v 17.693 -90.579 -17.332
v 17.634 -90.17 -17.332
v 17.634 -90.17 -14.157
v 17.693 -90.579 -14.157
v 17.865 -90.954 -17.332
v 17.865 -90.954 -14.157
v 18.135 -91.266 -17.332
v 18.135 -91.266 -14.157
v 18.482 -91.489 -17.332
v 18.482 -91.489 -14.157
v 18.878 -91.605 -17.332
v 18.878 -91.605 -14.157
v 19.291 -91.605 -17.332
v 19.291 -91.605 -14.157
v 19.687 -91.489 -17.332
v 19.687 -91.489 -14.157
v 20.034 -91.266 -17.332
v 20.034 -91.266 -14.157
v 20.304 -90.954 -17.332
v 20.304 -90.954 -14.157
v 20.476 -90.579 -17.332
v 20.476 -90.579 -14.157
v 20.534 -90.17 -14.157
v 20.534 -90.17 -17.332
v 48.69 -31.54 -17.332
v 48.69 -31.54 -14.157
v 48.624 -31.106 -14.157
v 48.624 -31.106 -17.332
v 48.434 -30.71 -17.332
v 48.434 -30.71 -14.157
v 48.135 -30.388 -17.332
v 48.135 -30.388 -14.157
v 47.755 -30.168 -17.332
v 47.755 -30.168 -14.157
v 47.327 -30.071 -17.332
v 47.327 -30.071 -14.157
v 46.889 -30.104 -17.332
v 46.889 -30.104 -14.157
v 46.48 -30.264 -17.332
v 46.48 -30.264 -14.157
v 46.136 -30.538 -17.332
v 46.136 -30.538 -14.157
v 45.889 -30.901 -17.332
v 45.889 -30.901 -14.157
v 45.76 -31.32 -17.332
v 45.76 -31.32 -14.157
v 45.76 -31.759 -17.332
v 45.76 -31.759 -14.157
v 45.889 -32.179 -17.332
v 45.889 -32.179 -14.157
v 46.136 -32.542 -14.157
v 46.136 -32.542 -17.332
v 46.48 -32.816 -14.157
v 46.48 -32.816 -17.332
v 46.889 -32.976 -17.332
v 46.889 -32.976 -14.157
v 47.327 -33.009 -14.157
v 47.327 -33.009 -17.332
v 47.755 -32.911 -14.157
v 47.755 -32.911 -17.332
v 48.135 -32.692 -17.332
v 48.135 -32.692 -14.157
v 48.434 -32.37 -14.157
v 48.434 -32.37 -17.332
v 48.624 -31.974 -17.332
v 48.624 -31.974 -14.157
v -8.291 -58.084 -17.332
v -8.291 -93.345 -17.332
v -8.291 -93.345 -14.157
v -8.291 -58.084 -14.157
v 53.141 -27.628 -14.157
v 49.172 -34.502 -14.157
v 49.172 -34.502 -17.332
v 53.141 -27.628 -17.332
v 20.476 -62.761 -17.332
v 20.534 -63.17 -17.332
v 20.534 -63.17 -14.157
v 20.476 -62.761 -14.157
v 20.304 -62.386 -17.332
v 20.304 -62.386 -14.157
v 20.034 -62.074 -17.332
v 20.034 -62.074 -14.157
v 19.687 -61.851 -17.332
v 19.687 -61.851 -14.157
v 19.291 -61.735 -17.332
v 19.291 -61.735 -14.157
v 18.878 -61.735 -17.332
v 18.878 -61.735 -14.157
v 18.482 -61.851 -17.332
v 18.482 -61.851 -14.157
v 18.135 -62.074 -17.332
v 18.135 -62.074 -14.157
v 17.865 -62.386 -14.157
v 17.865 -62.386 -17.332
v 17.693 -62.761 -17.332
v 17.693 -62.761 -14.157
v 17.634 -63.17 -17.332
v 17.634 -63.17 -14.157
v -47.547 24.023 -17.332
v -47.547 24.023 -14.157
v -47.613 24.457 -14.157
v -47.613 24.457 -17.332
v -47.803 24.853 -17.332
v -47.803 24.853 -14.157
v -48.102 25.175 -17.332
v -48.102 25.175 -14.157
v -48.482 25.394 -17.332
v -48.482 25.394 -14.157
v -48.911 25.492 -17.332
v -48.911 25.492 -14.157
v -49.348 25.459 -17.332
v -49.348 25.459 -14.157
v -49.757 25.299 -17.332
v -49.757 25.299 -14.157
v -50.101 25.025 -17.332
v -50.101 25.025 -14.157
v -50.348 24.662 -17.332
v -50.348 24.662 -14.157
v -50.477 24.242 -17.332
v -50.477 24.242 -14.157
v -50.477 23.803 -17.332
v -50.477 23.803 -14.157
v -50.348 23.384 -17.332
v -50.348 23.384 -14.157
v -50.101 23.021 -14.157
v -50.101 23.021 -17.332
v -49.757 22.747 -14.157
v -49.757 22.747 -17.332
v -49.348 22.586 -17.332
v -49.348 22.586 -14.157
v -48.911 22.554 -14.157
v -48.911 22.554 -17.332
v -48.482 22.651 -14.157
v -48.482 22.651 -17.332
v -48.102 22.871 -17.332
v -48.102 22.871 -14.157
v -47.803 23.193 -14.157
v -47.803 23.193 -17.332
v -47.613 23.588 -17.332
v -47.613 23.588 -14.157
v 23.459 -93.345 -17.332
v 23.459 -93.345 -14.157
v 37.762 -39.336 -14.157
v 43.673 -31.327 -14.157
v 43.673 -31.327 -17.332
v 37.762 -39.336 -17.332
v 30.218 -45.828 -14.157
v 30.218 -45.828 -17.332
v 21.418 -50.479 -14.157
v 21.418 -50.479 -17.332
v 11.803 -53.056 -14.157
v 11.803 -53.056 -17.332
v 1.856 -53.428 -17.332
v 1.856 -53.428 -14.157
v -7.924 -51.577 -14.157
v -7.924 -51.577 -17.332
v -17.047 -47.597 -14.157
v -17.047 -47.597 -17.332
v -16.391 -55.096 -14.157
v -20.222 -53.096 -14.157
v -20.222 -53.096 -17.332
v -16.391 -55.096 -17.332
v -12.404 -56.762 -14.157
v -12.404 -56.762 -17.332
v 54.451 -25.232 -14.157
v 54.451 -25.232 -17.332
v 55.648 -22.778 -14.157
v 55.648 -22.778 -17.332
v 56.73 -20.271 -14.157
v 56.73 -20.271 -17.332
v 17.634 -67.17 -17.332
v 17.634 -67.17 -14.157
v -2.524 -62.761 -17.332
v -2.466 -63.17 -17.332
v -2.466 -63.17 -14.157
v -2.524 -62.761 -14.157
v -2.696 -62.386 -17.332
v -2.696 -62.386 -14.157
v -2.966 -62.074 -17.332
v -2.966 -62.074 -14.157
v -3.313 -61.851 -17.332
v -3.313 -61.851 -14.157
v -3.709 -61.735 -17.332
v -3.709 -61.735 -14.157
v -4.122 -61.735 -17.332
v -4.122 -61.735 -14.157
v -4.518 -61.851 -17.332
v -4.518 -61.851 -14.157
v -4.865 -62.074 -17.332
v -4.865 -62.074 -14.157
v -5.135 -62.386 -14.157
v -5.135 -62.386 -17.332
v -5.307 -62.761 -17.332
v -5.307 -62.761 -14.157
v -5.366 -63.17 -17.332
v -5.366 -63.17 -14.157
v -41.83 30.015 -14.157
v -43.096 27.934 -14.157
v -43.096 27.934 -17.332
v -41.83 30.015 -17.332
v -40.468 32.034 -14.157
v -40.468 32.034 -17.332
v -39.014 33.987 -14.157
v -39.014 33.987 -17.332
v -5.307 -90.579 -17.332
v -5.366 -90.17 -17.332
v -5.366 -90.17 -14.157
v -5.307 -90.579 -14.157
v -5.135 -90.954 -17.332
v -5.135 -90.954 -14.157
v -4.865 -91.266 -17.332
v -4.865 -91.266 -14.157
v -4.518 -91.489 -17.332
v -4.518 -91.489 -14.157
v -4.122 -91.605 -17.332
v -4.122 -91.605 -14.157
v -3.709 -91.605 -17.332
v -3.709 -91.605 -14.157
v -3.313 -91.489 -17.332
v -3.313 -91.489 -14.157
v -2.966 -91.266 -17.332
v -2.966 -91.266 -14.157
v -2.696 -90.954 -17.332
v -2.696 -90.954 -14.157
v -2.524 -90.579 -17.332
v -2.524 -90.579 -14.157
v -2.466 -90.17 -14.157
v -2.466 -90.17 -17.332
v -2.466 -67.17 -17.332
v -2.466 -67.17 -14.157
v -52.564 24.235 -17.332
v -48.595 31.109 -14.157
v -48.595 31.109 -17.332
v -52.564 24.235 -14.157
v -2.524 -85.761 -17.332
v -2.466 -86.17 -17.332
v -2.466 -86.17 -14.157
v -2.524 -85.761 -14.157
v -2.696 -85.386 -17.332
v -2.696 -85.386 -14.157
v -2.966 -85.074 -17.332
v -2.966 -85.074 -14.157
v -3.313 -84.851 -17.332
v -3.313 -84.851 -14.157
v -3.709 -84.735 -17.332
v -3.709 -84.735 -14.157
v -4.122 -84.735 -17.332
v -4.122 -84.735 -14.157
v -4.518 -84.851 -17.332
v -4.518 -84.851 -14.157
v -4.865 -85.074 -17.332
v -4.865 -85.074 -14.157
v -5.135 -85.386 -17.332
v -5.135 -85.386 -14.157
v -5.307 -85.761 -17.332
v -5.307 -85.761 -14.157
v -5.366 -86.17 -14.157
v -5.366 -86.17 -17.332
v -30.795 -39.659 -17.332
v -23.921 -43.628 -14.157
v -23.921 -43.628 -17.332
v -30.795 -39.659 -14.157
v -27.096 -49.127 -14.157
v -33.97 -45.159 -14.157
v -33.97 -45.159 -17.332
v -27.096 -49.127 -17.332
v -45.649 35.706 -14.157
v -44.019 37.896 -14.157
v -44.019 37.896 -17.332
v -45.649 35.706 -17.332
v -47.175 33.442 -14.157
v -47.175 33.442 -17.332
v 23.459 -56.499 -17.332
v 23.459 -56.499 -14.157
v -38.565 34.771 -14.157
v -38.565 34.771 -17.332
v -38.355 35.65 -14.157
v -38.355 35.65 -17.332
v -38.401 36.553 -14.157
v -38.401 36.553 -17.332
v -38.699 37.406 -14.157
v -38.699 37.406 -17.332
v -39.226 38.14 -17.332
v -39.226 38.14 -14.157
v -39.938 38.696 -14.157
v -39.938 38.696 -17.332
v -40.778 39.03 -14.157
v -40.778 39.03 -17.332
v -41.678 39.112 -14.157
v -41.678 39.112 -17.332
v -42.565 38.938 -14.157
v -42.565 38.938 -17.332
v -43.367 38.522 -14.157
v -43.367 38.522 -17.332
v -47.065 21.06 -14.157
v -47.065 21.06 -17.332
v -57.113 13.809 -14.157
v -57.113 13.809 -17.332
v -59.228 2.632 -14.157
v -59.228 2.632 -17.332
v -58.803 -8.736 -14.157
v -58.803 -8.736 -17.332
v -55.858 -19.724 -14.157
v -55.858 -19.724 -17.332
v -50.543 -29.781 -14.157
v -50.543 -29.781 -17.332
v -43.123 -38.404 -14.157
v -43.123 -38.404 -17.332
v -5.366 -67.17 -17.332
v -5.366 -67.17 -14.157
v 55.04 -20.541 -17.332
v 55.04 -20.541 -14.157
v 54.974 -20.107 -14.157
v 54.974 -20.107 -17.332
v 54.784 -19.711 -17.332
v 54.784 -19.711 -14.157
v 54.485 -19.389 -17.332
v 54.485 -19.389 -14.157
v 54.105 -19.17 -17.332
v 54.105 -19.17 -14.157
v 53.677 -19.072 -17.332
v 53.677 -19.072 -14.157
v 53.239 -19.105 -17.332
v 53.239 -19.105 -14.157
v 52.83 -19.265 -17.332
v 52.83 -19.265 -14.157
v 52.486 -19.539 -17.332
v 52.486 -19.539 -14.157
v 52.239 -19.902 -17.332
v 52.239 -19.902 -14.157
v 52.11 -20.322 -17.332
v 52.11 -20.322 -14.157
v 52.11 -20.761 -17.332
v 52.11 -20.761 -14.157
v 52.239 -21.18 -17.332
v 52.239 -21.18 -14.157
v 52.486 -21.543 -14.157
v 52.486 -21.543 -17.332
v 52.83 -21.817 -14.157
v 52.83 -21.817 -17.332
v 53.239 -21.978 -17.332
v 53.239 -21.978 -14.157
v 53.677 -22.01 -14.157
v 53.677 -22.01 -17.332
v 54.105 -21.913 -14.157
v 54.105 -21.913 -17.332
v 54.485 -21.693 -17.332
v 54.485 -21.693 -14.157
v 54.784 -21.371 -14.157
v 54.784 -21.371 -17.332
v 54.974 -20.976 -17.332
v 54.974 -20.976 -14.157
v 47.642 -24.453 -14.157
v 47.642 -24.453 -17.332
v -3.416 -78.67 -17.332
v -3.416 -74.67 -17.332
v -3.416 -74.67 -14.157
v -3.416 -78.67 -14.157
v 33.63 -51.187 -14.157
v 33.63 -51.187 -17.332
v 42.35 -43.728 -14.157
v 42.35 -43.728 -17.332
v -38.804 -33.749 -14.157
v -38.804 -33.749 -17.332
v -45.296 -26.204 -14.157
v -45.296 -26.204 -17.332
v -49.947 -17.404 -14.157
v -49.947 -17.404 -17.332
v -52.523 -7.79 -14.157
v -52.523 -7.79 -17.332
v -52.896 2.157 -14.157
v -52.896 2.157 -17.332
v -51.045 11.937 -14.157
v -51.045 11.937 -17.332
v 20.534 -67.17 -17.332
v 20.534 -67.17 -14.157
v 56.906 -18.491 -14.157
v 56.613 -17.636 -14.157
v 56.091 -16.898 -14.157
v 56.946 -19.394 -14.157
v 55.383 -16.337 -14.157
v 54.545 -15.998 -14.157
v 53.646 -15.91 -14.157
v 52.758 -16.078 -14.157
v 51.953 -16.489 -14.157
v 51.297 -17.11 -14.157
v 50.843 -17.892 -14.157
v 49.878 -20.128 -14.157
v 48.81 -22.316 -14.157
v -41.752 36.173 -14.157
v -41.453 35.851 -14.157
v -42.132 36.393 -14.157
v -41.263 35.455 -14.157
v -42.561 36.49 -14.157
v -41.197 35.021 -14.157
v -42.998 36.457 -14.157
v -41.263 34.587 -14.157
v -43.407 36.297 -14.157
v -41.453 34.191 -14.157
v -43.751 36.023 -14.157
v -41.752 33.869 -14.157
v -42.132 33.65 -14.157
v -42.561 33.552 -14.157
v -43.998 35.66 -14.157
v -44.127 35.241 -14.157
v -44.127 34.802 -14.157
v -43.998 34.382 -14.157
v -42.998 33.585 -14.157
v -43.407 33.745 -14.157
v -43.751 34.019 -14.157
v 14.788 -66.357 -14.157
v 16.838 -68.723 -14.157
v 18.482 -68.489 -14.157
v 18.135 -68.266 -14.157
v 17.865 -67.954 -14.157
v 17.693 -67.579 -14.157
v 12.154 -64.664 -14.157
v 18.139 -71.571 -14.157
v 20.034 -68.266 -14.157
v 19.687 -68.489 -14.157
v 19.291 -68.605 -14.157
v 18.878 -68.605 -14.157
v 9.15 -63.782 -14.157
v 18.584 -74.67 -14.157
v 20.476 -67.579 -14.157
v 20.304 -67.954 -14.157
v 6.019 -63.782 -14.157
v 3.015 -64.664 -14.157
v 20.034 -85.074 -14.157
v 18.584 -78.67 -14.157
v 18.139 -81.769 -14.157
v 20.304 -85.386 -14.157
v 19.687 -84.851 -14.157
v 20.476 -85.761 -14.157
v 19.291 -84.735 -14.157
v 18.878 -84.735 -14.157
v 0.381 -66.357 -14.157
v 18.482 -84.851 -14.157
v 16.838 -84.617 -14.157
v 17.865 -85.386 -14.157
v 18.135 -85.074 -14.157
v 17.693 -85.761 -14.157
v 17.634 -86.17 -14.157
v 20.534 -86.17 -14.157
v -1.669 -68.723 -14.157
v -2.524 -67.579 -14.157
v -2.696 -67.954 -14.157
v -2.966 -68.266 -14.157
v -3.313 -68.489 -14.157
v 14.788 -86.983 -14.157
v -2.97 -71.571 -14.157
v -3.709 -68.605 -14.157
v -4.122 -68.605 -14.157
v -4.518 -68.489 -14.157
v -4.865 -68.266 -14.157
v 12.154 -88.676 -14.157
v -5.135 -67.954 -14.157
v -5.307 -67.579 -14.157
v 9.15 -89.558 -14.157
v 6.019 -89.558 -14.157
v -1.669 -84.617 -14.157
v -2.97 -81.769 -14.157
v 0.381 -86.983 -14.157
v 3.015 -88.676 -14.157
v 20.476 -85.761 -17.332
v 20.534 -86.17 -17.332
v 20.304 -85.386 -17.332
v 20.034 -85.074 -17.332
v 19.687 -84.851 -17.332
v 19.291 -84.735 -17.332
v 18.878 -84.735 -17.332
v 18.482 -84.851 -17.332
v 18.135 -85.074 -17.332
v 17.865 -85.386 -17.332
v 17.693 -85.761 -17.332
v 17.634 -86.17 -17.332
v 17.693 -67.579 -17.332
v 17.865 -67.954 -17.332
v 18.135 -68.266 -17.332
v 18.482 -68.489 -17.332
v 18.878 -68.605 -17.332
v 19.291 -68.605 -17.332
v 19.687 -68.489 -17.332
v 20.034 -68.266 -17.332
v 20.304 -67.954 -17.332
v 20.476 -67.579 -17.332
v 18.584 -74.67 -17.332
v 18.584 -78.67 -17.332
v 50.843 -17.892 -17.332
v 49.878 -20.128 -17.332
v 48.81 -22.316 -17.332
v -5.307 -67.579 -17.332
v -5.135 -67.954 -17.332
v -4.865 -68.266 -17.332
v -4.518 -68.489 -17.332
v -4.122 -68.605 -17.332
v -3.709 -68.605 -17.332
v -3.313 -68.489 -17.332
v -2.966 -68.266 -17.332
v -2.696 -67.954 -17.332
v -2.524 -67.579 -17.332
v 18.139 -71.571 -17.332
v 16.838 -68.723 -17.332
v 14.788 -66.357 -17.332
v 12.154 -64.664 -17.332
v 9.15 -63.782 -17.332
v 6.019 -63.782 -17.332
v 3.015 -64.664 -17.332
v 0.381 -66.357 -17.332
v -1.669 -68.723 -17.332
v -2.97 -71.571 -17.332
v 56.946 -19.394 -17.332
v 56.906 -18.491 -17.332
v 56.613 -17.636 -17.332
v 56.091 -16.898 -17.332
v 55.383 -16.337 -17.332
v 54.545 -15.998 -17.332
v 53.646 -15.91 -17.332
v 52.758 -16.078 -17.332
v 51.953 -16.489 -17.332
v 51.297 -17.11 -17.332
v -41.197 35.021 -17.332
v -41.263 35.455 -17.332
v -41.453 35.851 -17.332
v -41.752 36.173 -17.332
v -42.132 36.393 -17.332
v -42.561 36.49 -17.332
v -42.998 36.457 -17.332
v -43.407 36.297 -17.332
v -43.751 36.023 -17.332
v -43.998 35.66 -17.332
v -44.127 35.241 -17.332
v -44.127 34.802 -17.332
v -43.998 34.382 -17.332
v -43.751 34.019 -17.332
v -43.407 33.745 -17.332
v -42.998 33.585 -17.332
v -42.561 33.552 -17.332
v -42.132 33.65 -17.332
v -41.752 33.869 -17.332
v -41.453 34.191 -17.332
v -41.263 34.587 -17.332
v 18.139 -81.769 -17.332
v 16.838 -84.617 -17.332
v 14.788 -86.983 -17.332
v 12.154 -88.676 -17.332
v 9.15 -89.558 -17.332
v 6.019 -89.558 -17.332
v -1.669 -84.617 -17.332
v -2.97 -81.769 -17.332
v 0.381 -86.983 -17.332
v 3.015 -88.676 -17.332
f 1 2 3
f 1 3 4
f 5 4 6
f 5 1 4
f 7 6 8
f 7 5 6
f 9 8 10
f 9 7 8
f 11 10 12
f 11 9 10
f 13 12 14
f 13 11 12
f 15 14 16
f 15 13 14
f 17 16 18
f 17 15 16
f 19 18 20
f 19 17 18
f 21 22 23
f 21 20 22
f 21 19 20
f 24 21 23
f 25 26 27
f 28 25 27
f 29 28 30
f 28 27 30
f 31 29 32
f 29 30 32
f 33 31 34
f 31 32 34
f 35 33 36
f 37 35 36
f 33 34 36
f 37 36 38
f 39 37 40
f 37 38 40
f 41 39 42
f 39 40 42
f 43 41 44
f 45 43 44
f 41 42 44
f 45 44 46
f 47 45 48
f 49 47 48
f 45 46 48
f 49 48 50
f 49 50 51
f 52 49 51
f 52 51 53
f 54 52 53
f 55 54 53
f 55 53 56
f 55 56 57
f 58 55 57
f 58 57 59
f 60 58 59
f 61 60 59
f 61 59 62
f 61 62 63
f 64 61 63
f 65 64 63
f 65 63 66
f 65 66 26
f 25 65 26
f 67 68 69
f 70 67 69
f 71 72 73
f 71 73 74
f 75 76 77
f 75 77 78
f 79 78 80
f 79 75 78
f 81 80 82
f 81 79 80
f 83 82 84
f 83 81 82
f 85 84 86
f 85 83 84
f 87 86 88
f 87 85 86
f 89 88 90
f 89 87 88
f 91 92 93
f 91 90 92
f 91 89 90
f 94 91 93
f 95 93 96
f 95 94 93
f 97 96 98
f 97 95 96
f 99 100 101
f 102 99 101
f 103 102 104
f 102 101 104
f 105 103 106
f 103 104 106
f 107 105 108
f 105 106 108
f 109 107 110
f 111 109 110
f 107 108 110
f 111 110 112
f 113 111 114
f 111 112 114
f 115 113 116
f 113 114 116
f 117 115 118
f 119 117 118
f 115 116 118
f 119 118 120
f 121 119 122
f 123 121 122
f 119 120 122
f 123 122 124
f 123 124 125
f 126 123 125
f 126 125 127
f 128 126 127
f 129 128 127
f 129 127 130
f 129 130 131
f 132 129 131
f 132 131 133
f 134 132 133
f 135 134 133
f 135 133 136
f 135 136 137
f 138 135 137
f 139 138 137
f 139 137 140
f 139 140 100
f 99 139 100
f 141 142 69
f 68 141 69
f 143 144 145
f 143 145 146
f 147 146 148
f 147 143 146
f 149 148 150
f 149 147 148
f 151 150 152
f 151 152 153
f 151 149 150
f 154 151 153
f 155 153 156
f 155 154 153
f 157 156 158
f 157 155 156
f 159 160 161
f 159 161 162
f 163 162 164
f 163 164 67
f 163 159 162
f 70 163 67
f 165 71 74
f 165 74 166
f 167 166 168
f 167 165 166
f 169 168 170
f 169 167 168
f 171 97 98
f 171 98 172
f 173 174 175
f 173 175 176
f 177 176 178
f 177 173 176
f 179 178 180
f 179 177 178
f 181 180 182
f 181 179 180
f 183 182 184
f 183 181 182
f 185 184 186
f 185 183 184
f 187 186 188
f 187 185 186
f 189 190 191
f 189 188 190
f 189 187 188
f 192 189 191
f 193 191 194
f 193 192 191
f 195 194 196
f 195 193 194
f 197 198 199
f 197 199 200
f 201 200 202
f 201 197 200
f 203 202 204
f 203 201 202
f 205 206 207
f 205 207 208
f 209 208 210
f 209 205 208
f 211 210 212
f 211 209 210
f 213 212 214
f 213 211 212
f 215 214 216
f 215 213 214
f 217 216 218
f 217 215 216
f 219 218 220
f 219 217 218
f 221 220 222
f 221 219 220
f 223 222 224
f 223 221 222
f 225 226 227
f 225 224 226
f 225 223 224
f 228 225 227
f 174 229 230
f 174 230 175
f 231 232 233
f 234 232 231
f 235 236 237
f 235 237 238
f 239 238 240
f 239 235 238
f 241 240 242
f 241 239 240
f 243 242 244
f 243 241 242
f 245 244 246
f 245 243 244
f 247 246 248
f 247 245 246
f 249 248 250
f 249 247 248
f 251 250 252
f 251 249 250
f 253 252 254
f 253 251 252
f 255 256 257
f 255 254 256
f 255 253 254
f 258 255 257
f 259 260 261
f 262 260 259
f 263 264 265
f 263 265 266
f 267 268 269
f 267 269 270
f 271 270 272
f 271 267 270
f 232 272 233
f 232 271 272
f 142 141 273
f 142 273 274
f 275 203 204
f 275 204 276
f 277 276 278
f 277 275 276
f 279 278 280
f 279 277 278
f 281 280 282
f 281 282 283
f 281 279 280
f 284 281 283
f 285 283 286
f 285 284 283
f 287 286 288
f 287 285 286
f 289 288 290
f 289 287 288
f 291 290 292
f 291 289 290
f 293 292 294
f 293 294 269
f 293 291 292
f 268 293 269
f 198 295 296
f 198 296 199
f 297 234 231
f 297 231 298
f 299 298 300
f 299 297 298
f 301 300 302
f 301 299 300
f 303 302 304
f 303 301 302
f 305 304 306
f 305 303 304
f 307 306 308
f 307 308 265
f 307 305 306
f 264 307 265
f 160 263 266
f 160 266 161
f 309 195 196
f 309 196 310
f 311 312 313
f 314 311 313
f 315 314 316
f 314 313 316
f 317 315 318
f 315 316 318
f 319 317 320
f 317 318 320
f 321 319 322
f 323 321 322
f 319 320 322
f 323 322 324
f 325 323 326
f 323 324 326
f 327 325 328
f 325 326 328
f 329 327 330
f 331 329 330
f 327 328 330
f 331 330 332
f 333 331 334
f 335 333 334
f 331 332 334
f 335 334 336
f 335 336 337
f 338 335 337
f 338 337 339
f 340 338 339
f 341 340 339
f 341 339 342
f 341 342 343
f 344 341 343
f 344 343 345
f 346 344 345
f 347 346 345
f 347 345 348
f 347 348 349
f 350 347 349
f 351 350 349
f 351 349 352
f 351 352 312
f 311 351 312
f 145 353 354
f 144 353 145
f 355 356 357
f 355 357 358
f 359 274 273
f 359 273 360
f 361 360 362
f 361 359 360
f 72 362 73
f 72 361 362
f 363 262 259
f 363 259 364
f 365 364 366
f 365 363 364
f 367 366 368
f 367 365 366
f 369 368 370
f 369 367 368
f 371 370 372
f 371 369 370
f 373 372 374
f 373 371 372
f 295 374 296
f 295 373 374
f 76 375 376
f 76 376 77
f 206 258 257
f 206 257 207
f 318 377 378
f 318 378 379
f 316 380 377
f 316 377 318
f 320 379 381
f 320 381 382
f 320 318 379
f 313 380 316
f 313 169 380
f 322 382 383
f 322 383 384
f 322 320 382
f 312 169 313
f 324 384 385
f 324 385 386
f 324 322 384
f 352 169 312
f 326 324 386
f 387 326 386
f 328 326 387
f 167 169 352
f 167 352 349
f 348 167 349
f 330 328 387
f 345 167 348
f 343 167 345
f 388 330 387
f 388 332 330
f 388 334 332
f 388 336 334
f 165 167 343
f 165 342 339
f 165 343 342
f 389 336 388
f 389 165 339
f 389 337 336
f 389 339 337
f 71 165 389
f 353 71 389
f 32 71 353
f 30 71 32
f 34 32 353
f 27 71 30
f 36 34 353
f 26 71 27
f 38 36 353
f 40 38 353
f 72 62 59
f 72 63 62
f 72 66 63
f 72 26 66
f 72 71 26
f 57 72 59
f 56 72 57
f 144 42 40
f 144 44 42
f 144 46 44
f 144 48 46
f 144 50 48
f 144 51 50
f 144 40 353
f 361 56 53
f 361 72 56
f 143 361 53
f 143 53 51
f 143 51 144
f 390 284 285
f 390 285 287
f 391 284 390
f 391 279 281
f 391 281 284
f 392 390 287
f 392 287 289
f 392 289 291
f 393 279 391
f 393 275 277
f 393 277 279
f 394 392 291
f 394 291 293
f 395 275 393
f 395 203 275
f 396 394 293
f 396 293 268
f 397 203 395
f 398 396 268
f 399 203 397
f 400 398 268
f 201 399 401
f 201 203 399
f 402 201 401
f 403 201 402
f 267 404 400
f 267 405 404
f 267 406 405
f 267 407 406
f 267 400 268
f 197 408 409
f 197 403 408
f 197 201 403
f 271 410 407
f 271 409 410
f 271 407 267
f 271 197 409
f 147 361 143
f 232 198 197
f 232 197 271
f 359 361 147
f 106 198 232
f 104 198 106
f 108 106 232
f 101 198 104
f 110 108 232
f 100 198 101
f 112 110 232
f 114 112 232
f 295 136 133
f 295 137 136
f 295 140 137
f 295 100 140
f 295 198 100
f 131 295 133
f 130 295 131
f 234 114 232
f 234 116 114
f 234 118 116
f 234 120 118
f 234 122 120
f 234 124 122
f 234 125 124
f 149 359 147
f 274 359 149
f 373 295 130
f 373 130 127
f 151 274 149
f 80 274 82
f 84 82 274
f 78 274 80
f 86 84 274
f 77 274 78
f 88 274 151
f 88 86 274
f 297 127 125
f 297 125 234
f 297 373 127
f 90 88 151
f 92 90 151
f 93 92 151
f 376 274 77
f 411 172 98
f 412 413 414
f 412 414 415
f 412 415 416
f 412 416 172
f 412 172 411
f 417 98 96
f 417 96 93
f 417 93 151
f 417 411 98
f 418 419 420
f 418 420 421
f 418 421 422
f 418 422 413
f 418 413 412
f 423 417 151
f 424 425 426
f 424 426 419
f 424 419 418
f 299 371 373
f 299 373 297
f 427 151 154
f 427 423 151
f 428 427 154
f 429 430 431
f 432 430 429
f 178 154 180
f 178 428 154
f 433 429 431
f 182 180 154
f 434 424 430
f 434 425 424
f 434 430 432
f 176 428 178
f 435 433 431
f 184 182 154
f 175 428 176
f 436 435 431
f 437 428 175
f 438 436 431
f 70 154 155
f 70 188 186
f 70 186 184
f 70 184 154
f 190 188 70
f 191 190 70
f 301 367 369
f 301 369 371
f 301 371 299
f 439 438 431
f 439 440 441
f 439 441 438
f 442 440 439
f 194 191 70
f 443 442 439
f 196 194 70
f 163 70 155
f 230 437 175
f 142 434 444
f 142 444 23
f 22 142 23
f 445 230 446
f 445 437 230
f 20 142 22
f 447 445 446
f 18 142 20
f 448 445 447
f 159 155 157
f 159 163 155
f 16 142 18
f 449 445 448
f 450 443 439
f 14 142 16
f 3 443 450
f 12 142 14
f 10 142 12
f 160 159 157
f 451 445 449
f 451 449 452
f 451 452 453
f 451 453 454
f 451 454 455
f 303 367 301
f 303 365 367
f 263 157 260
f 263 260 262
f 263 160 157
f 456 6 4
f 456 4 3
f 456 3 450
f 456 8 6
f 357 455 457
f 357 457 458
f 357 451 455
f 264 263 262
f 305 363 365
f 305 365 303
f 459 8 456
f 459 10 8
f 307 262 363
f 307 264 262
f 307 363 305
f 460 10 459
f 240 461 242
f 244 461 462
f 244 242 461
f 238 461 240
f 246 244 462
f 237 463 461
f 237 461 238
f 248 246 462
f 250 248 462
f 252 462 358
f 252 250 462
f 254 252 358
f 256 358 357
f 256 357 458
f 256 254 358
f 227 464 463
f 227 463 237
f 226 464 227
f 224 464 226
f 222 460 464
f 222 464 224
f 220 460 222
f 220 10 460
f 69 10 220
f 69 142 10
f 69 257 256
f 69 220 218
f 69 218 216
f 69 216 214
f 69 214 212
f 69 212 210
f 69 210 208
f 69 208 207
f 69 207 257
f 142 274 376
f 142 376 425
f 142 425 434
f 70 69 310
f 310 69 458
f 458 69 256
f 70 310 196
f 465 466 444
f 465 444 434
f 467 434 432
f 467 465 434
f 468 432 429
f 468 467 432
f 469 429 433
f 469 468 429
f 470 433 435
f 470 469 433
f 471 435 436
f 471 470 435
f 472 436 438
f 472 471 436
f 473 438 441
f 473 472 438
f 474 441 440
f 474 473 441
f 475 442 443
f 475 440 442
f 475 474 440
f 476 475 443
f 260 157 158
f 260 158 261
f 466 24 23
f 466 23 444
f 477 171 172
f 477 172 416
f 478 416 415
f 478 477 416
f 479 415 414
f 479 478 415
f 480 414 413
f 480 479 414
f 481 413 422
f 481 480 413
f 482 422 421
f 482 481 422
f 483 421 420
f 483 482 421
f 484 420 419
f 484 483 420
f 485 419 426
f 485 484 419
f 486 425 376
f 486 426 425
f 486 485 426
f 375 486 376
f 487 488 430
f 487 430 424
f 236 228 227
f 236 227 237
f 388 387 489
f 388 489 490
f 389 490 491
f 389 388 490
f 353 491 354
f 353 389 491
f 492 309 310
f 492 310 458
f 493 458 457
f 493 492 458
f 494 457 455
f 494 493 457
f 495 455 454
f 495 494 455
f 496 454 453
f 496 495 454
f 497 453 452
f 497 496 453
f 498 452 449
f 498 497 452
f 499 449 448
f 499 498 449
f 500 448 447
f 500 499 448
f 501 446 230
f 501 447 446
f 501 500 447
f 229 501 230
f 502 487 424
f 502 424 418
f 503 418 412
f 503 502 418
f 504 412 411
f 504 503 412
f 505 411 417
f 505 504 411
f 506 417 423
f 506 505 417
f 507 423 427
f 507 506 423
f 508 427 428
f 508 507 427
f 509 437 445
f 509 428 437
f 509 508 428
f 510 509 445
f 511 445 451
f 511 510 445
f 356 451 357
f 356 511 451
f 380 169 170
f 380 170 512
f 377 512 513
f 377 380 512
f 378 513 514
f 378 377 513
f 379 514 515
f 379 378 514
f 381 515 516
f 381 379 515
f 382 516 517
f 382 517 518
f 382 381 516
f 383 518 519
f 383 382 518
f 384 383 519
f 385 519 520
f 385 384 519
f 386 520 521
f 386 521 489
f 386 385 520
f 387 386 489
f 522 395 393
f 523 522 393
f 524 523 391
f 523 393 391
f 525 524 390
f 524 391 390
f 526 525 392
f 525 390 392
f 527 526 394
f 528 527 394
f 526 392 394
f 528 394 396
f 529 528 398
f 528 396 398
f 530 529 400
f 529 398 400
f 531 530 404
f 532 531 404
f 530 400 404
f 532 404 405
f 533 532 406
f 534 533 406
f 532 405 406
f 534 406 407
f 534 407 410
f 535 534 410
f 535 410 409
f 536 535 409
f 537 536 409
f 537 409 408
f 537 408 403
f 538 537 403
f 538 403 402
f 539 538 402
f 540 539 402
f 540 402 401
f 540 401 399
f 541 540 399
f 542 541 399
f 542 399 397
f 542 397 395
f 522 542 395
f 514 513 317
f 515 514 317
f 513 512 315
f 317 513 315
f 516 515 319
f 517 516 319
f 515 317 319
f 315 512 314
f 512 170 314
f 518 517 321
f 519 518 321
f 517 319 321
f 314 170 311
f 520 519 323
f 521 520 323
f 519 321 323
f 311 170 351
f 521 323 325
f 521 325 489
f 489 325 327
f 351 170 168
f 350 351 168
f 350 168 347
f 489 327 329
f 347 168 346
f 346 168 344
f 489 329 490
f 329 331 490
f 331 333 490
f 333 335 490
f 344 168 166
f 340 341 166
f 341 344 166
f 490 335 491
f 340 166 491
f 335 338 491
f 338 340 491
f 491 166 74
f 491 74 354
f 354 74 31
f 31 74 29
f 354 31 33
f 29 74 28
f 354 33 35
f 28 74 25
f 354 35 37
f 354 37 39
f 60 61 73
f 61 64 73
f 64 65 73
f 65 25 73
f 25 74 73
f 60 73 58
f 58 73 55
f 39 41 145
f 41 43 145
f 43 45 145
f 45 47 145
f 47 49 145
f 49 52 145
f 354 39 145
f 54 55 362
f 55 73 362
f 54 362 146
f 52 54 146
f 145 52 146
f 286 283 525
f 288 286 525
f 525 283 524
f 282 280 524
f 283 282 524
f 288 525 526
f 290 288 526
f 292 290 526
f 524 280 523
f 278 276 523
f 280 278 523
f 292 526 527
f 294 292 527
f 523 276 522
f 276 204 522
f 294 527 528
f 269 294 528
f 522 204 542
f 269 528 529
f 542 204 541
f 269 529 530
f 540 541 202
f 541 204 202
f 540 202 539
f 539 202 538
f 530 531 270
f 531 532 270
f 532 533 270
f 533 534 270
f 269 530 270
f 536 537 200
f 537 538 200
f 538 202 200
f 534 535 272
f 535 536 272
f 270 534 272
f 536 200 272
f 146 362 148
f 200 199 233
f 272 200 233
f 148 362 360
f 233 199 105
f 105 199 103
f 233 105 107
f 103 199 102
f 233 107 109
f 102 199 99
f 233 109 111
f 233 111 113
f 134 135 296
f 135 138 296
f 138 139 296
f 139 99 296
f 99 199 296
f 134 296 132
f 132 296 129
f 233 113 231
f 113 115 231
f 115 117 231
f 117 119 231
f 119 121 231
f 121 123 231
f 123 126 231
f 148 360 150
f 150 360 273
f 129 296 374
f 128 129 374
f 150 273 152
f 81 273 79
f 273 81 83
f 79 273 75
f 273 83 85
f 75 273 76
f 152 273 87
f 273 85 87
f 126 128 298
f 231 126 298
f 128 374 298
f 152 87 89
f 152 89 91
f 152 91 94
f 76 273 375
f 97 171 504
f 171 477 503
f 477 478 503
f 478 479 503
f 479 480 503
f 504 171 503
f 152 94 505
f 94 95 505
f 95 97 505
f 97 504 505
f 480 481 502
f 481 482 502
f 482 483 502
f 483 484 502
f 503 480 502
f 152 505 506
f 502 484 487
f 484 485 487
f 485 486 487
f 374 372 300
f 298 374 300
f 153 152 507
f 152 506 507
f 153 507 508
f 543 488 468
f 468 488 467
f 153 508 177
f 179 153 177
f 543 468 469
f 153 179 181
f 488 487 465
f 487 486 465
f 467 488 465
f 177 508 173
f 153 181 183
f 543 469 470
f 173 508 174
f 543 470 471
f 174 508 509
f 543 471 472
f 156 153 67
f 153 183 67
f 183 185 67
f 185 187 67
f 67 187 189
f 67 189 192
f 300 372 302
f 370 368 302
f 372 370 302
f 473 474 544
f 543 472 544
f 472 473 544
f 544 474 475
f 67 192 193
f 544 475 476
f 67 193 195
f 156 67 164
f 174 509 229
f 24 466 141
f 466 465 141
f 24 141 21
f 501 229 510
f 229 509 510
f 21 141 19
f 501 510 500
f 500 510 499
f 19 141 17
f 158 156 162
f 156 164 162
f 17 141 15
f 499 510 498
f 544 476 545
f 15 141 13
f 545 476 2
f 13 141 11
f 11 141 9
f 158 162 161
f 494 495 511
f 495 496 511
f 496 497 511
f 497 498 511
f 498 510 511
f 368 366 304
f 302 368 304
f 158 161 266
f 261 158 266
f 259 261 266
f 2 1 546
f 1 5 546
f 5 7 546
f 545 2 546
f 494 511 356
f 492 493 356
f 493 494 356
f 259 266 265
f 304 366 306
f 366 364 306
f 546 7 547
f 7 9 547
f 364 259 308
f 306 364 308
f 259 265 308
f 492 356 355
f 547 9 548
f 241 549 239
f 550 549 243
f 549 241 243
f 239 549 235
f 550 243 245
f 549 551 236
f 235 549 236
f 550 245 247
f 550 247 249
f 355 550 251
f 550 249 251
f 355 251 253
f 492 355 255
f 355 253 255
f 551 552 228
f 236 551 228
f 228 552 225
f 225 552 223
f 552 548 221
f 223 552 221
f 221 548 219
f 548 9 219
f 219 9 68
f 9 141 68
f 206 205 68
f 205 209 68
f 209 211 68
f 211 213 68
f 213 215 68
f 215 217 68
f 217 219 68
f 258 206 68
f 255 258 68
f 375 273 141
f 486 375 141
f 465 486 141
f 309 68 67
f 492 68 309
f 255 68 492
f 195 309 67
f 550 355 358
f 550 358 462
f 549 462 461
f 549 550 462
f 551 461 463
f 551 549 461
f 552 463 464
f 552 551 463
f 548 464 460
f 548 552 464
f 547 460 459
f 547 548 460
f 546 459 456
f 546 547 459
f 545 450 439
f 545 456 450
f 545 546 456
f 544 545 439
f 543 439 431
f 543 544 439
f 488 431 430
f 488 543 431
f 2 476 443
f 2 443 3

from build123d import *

# Parameters (mm, degrees)
BOSS_EXTRUDE1_DEPTH      = 3.175
BOSS_EXTRUDE2_DEPTH      = 3.175
BOSS_EXTRUDE2_DEPTH_BACK = 34.925
SKETCH2_W                = 31.75
SKETCH2_H                = 3.175
CUT_EXTRUDE1_DEPTH       = 111.671398355
F_4_CLEARANCE_HOLE1_D    = 2.9464


with BuildPart() as part:
    # Sketch1 → Boss-Extrude1 (new body)
    with BuildSketch(Plane(origin=(0, 0, -14.15699402), x_dir=(-1, 0, 0), z_dir=(0, 0, -1))):
        with BuildLine():
            Line((-49.172312317, -34.502108483), (-53.141062317, -27.628031841))
            ThreePointArc((-53.141062317, -27.628031841), (-55.063803638, -24.012221257), (-56.72992661, -20.271224785))
            ThreePointArc((-56.72992661, -20.271224785), (-54.976138042, -16.13776671), (-50.842679967, -17.891555277))
            ThreePointArc((-50.842679967, -17.891555277), (-49.356678398, -21.228119699), (-47.641801003, -24.453031841))
            Line((-47.641801003, -24.453031841), (-43.673051003, -31.327108483))
            ThreePointArc((-43.673051003, -31.327108483), (-16.68272836, -52.037511462), (17.046778195, -47.596937682))
            Line((17.046778195, -47.596937682), (23.920854837, -43.628187682))
            Line((23.920854837, -43.628187682), (30.79493148, -39.659437682))
            ThreePointArc((30.79493148, -39.659437682), (51.505334458, -12.669115038), (47.064760678, 21.060391517))
            Line((47.064760678, 21.060391517), (43.096010678, 27.934468159))
            ThreePointArc((43.096010678, 27.934468159), (41.160593535, 31.032051618), (39.01404477, 33.987248938))
            ThreePointArc((39.01404477, 33.987248938), (39.561948355, 38.44382292), (44.018522337, 37.895919335))
            ThreePointArc((44.018522337, 37.895919335), (46.425258832, 34.58251628), (48.595271992, 31.109468159))
            Line((48.595271992, 31.109468159), (52.564021992, 24.235391517))
            ThreePointArc((52.564021992, 24.235391517), (57.638963455, -14.312615975), (33.96993148, -45.158698996))
            Line((33.96993148, -45.158698996), (27.095854837, -49.127448996))
            Line((27.095854837, -49.127448996), (20.221778195, -53.096198996))
            ThreePointArc((20.221778195, -53.096198996), (-18.326229296, -58.171140459), (-49.172312317, -34.502108483))
        make_face()
    extrude(amount=BOSS_EXTRUDE1_DEPTH)

    # Sketch2 → Boss-Extrude2 (add, two sides: drawn at the far end of the back side and taken through both)
    with BuildSketch(Plane(origin=(8.682443514, -58.42, 0), x_dir=(-1, 0, 0), z_dir=(0, 1, 0)).offset(-BOSS_EXTRUDE2_DEPTH_BACK)):
        with Locations((1.098025871, -15.74449402)):
            Rectangle(SKETCH2_W, SKETCH2_H)
    extrude(amount=BOSS_EXTRUDE2_DEPTH + BOSS_EXTRUDE2_DEPTH_BACK)

    # Sketch3 → Cut-Extrude1 (cut, through all)
    with BuildSketch(Plane(origin=(0, 0, -17.33199402), x_dir=(-1, 0, 0), z_dir=(0, 0, -1))):
        with BuildLine():
            Line((-20.534417629, -67.17), (-20.534417629, -63.17))
            ThreePointArc((-20.534417629, -63.17), (-19.084417629, -61.72), (-17.634417629, -63.17))
            Line((-17.634417629, -63.17), (-17.634417629, -67.17))
            ThreePointArc((-17.634417629, -67.17), (-19.084417629, -68.62), (-20.534417629, -67.17))
        make_face()
        with BuildLine():
            Line((2.465582371, -67.17), (2.465582371, -63.17))
            ThreePointArc((2.465582371, -63.17), (3.915582371, -61.72), (5.365582371, -63.17))
            Line((5.365582371, -63.17), (5.365582371, -67.17))
            ThreePointArc((5.365582371, -67.17), (3.915582371, -68.62), (2.465582371, -67.17))
        make_face()
        with BuildLine():
            Line((-20.534417629, -90.17), (-20.534417629, -86.17))
            ThreePointArc((-20.534417629, -86.17), (-19.084417629, -84.72), (-17.634417629, -86.17))
            Line((-17.634417629, -86.17), (-17.634417629, -90.17))
            ThreePointArc((-17.634417629, -90.17), (-19.084417629, -91.62), (-20.534417629, -90.17))
        make_face()
        with BuildLine():
            Line((2.465582371, -90.17), (2.465582371, -86.17))
            ThreePointArc((2.465582371, -86.17), (3.915582371, -84.72), (5.365582371, -86.17))
            Line((5.365582371, -86.17), (5.365582371, -90.17))
            ThreePointArc((5.365582371, -90.17), (3.915582371, -91.62), (2.465582371, -90.17))
        make_face()
        with BuildLine():
            Line((-18.584417642, -78.67), (-18.584417642, -74.67))
            ThreePointArc((-18.584417642, -74.67), (-7.584417642, -63.67), (3.415582358, -74.67))
            Line((3.415582358, -74.67), (3.415582358, -78.67))
            ThreePointArc((3.415582358, -78.67), (-7.584417642, -89.67), (-18.584417642, -78.67))
        make_face()
    extrude(amount=-CUT_EXTRUDE1_DEPTH, mode=Mode.SUBTRACT)

    # #4 Clearance Hole1 (through all)
    with Locations(Plane(origin=(0, 0, -17.33199402), x_dir=(-1, 0, 0), z_dir=(0, 0, -1))):
        with Locations((-53.56643166, -20.541270527), (-47.21643166, -31.539793155), (42.670641335, 35.021229473), (49.020641335, 24.022706845)):
            Hole(F_4_CLEARANCE_HOLE1_D / 2)


solid = part.part
